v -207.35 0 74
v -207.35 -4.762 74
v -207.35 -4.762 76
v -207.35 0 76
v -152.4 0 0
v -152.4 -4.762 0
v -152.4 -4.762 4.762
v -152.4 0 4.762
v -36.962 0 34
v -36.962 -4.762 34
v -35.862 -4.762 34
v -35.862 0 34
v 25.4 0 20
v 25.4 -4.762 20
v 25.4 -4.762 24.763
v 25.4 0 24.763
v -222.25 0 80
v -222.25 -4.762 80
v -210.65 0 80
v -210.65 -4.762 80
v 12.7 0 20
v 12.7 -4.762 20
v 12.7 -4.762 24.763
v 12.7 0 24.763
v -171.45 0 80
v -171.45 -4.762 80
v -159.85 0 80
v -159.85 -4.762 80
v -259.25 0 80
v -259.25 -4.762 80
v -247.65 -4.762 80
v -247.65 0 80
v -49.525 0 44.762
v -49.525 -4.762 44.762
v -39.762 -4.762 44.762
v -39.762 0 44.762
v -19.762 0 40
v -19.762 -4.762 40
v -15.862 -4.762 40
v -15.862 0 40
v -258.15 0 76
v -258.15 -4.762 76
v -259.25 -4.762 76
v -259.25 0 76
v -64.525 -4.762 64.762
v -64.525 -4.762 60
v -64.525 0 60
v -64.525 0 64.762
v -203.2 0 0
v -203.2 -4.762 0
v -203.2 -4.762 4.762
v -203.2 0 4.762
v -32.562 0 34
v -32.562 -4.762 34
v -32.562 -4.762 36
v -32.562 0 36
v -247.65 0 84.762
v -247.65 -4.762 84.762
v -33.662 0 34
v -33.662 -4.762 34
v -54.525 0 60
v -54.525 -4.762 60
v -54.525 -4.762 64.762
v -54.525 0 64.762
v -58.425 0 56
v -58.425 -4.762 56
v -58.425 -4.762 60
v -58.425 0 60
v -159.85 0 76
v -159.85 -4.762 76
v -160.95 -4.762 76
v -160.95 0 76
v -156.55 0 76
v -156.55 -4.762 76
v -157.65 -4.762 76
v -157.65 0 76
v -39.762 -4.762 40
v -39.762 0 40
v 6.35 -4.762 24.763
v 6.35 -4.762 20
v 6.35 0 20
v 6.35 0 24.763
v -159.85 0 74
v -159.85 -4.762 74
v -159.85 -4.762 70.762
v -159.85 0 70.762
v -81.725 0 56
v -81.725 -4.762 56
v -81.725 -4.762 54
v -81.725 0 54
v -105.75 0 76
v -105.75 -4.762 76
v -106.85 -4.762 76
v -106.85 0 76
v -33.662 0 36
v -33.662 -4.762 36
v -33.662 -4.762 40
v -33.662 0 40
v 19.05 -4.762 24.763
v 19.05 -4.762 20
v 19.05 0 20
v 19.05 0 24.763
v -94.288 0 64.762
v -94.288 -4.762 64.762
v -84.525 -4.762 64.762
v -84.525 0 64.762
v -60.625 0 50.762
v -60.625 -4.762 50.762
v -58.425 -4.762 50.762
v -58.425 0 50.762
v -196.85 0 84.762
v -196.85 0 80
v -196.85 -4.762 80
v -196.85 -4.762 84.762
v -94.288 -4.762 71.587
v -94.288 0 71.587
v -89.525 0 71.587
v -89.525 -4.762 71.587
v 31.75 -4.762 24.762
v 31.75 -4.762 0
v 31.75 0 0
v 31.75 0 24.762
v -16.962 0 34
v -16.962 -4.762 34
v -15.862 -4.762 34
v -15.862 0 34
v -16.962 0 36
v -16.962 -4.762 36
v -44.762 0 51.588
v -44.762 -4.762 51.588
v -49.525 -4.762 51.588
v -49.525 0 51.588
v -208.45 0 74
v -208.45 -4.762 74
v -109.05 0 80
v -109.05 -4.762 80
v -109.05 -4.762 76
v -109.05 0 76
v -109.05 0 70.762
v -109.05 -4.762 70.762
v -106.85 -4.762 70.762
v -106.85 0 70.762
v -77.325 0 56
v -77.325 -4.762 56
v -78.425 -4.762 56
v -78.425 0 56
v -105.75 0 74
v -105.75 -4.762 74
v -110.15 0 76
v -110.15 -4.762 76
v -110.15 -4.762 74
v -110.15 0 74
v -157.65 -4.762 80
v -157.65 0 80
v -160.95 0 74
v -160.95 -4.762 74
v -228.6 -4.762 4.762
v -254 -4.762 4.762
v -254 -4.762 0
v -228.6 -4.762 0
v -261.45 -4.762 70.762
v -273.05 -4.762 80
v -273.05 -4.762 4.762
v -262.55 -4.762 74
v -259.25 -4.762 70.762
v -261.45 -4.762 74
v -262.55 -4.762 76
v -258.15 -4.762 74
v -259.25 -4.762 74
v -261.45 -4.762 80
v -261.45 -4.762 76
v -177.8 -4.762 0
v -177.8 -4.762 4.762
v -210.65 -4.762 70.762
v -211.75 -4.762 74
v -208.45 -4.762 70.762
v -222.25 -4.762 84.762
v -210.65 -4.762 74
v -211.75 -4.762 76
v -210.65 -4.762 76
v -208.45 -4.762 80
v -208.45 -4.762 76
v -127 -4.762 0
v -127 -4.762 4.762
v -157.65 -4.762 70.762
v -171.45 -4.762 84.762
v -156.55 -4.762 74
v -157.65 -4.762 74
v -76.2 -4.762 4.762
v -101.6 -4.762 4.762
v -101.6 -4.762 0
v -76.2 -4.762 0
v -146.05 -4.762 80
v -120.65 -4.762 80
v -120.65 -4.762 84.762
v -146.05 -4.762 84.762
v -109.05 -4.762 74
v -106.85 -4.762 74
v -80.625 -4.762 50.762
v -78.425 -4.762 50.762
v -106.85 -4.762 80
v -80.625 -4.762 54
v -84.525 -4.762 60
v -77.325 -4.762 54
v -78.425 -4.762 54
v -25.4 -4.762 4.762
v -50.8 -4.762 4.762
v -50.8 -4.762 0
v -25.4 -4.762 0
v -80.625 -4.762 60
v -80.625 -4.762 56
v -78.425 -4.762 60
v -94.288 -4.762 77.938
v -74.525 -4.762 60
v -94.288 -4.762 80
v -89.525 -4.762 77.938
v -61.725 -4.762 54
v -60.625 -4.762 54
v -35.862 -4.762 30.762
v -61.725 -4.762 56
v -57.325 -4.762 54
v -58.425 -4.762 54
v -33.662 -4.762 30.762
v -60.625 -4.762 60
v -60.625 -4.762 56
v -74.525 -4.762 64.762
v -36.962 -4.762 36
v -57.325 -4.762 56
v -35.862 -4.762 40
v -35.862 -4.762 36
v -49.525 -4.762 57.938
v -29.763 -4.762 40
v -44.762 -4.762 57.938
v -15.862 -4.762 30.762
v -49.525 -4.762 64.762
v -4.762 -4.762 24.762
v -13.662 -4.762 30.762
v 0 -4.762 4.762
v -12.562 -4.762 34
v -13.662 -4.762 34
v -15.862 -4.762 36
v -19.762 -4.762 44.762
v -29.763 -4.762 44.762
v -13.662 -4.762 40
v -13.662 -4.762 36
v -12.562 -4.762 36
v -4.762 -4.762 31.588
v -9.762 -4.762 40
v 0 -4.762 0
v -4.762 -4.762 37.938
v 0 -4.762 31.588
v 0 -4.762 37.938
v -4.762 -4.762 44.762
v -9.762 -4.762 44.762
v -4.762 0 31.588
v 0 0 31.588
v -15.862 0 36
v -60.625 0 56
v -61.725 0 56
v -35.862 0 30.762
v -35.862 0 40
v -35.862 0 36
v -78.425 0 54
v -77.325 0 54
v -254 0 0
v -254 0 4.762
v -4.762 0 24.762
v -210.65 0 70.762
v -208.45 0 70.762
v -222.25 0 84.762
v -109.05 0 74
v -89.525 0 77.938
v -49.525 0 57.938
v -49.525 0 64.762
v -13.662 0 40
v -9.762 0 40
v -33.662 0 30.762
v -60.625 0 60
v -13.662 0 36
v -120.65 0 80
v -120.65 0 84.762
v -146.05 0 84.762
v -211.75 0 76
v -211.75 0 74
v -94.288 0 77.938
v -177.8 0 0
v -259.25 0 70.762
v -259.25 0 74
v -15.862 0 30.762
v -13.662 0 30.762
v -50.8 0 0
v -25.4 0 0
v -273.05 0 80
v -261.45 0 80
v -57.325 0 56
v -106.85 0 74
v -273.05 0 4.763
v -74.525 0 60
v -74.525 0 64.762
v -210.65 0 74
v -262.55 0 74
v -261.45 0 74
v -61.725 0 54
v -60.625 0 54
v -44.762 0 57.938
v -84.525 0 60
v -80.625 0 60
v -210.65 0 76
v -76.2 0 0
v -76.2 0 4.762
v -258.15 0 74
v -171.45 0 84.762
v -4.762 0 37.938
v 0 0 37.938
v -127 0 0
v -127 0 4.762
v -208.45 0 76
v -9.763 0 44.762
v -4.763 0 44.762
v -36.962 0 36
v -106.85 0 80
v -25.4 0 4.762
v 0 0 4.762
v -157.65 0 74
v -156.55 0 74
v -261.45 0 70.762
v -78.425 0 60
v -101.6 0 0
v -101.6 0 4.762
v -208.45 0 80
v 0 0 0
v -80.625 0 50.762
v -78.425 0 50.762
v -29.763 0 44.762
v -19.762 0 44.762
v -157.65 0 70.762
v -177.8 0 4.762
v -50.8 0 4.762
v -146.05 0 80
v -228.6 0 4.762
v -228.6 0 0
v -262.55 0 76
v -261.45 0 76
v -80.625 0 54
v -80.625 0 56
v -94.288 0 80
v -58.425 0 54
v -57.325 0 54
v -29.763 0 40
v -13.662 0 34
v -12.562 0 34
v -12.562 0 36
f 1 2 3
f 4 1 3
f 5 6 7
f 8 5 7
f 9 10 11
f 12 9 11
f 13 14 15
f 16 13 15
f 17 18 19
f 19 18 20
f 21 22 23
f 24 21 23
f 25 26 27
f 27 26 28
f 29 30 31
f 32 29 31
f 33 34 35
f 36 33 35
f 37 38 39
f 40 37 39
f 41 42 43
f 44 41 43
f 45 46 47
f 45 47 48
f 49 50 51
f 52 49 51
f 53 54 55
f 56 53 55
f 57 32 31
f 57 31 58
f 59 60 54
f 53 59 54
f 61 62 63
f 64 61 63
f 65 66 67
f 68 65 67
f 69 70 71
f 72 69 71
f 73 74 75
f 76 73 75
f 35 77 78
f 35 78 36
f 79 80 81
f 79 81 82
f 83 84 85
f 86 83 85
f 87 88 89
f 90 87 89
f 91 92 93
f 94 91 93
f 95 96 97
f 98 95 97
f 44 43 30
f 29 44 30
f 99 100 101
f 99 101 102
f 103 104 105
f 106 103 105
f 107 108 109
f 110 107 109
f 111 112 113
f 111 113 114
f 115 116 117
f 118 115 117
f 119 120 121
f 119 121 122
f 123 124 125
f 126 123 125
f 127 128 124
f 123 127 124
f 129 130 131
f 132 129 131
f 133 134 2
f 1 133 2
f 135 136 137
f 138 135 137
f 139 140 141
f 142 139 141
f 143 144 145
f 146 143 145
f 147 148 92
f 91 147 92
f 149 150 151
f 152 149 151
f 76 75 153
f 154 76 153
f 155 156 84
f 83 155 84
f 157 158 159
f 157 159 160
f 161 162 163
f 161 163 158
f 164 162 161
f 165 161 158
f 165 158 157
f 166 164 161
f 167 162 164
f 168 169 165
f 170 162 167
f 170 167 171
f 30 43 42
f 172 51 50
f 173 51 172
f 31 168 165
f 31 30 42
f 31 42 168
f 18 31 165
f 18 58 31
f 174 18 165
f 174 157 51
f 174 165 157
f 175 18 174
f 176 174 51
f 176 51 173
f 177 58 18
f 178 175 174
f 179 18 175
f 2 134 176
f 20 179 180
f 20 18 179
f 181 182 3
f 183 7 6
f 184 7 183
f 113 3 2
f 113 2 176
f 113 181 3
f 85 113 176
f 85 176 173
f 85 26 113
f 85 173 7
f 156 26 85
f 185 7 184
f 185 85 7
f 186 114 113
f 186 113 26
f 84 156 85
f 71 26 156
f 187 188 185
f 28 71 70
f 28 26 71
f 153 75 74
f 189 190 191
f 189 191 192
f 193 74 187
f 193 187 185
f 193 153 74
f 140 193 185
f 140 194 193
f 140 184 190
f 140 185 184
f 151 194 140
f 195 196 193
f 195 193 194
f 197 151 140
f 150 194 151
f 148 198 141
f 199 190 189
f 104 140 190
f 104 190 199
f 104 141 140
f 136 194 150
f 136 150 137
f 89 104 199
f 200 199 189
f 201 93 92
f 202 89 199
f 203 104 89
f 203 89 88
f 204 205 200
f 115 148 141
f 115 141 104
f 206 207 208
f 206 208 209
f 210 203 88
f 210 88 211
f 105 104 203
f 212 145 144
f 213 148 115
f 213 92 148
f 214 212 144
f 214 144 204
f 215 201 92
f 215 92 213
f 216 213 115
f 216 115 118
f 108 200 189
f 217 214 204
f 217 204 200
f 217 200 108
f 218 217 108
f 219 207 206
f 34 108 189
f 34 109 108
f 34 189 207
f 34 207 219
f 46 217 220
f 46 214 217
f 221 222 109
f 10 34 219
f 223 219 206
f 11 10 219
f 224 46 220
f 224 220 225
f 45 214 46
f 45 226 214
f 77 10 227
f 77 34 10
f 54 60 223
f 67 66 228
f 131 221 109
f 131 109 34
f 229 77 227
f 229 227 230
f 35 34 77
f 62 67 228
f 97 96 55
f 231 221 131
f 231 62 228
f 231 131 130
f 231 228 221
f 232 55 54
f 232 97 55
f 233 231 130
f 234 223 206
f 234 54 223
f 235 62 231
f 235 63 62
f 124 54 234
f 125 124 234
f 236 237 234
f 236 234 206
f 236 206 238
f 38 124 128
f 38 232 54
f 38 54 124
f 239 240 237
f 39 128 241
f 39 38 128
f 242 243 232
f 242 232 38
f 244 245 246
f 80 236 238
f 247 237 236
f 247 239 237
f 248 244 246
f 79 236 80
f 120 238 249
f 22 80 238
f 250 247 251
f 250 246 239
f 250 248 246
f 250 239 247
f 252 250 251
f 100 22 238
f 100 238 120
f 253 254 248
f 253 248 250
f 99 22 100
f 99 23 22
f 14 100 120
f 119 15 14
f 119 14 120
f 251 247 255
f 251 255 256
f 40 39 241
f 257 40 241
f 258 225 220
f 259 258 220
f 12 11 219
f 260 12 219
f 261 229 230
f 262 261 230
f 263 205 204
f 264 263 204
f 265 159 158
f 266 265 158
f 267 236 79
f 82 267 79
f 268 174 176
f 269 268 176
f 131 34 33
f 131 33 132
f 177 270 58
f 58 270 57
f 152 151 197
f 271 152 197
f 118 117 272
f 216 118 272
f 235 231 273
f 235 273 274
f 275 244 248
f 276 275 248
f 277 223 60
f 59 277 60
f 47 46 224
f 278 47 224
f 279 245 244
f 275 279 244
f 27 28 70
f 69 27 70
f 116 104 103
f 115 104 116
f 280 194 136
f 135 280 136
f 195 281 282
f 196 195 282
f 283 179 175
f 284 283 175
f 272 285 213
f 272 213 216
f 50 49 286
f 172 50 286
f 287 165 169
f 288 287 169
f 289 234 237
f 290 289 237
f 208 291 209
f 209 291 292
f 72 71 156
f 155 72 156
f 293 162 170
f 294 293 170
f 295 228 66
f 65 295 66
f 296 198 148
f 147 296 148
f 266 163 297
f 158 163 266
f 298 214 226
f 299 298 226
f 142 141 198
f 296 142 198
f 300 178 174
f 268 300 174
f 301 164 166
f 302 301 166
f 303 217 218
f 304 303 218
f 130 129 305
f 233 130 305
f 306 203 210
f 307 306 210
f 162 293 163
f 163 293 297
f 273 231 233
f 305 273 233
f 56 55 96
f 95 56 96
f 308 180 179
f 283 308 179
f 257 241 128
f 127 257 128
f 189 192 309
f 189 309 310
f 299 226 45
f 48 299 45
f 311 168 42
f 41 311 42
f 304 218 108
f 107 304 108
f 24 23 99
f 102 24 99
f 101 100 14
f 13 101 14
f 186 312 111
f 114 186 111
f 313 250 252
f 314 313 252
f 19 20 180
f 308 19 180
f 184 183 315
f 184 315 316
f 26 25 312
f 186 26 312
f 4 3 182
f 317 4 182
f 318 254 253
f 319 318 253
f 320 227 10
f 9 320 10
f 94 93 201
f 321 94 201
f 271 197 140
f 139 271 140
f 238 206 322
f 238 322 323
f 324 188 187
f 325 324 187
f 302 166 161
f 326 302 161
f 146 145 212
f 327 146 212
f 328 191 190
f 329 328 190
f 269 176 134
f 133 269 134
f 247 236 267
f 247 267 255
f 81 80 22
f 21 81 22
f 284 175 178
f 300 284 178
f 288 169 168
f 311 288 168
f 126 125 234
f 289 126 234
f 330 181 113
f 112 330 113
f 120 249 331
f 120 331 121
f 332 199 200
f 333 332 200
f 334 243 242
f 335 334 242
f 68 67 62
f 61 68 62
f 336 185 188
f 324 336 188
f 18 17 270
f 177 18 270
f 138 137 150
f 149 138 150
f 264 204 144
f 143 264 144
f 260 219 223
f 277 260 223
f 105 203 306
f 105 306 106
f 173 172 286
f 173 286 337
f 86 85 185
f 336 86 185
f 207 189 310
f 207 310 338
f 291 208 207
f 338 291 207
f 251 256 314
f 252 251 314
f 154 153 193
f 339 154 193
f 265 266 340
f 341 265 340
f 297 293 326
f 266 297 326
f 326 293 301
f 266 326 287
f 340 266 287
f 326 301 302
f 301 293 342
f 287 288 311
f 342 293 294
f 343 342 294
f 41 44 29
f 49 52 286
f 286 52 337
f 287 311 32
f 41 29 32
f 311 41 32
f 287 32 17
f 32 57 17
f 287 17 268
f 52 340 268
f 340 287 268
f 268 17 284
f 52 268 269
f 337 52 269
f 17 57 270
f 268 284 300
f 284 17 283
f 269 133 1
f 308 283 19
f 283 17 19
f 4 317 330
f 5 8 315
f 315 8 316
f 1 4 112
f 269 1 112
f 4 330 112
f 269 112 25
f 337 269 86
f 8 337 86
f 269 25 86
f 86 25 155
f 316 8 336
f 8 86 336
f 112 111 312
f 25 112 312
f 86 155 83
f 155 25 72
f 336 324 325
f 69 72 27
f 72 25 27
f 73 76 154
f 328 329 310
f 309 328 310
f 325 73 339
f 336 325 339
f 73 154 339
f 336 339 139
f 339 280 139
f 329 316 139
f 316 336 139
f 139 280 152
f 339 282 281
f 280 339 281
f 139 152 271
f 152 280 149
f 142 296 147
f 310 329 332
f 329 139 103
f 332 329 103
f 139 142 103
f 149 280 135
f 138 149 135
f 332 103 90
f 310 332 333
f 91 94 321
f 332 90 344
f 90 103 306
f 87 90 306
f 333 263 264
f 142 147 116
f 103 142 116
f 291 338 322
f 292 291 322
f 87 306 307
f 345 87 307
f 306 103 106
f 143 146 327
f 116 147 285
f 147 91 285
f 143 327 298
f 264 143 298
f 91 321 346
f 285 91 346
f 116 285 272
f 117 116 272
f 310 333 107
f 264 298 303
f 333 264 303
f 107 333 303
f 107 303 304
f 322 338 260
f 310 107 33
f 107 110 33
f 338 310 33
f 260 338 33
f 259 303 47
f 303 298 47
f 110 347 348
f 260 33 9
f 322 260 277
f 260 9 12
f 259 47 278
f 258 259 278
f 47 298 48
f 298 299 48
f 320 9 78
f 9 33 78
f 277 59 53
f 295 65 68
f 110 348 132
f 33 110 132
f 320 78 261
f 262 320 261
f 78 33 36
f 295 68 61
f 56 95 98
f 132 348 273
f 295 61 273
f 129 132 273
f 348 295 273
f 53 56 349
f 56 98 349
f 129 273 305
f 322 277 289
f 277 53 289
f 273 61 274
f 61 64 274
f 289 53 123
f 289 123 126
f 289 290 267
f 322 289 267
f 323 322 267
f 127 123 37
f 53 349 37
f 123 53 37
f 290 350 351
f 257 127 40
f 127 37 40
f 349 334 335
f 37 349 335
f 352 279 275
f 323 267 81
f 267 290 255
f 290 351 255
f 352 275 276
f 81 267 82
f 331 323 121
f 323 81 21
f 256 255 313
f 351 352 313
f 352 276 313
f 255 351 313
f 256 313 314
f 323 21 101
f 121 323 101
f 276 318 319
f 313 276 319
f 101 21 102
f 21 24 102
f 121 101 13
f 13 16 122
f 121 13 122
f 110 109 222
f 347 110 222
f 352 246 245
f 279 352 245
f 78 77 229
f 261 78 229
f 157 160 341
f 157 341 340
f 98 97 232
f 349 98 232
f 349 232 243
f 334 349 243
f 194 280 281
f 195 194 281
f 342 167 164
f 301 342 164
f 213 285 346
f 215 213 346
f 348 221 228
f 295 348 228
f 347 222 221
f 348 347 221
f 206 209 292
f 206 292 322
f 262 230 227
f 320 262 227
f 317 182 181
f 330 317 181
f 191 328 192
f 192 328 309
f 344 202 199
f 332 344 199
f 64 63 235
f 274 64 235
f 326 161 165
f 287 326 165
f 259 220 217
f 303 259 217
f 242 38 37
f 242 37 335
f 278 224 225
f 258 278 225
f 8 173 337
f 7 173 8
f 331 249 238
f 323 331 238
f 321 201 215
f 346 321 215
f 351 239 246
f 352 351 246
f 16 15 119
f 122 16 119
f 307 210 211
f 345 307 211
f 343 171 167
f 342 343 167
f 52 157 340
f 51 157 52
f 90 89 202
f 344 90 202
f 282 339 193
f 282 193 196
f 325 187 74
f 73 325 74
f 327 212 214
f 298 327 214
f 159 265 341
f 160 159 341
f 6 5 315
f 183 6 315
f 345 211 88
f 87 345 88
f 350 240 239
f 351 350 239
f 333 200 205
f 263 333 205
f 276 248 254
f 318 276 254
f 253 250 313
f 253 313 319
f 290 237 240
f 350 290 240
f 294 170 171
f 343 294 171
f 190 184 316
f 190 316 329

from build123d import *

# Parameters (mm, degrees)
F1_DEPTH  = 4.7625
F2_W      = 19.05
F2_H      = 4.7625
F2_W_2    = 25.4
F3_DEPTH  = 25.4
F4_W      = 4.7625
F4_H      = 6.825
F4_W_2    = 0.2375
F4_W_3    = 4.525
F5_DEPTH  = 25.4
F6_W      = 31.75
F6_H      = 24.7625
F7_DEPTH  = 4.7625
F8_W      = 4.7625
F8_H      = 6.825
F9_DEPTH  = 25.4
F10_W     = 6.35
F10_H     = 4.7625
F11_DEPTH = 25.4
F12_W     = 10
F12_H     = 4.7625
F13_DEPTH = 25.4
F14_W     = 25.4
F14_H     = 4.7625
F14_W_2   = 26.3625
F15_DEPTH = 25.4
F17_DEPTH = 25.4


with BuildPart() as f1:
    # F0 (on Front) → F1 (new body)
    with BuildSketch(Plane.XZ):
        Polygon((-273.05, 0), (0, 0), (0, 44.7625), (-44.7625, 44.7625), (-44.7625, 64.7625), (-89.525, 64.7625), (-89.525, 84.7625), (-129.525, 84.7625), (-273.05, 84.7625), align=None)
    extrude(amount=F1_DEPTH)

    # F2 (on face) → F3 (cut)
    with BuildSketch(Plane.XZ.offset(4.7625)):
        with Locations((-263.525, 2.38125)):
            Rectangle(F2_W, F2_H)
        with Locations((-12.7, 2.38125)):
            Rectangle(F2_W_2, F2_H)
        with Locations((-63.5, 2.38125)):
            Rectangle(F2_W_2, F2_H)
        with Locations((-114.3, 2.38125)):
            Rectangle(F2_W_2, F2_H)
        with Locations((-165.1, 2.38125)):
            Rectangle(F2_W_2, F2_H)
        with Locations((-215.9, 2.38125)):
            Rectangle(F2_W_2, F2_H)
    extrude(amount=-F3_DEPTH, mode=Mode.SUBTRACT)

    # F4 (on face) → F5 (cut)
    with BuildSketch(Plane.XZ.offset(4.7625)):
        with Locations((-47.14375, 61.35)):
            Rectangle(F4_W, F4_H)
        with Locations((-44.88125, 48.175)):
            Rectangle(F4_W_2, F4_H)
        with Locations((-47.2625, 48.175)):
            Rectangle(F4_W_3, F4_H)
        with Locations((-91.90625, 81.35)):
            Rectangle(F4_W, F4_H)
        with Locations((-91.90625, 68.175)):
            Rectangle(F4_W, F4_H)
    extrude(amount=-F5_DEPTH, mode=Mode.SUBTRACT)

    # F6 (on face) → F7 (join)
    with BuildSketch(Plane.XZ.offset(4.7625)):
        with Locations((15.875, 12.38125)):
            Rectangle(F6_W, F6_H)
    extrude(amount=-F7_DEPTH)

    # F8 (on face) → F9 (cut)
    with BuildSketch(Plane.XZ.offset(4.7625)):
        with Locations((-2.38125, 41.35)):
            Rectangle(F8_W, F8_H)
        with Locations((-2.38125, 28.175)):
            Rectangle(F8_W, F8_H)
    extrude(amount=-F9_DEPTH, mode=Mode.SUBTRACT)

    # F10 (on face) → F11 (cut)
    with BuildSketch(Plane.XZ.offset(4.7625)):
        with Locations((9.525, 22.38125)):
            Rectangle(F10_W, F10_H)
        with Locations((22.225, 22.38125)):
            Rectangle(F10_W, F10_H)
    extrude(amount=-F11_DEPTH, mode=Mode.SUBTRACT)

    # F12 (on face) → F13 (cut)
    with BuildSketch(Plane.XZ.offset(4.7625)):
        with Locations((-34.7625, 42.38125)):
            Rectangle(F12_W, F12_H)
        with Locations((-14.7625, 42.38125)):
            Rectangle(F12_W, F12_H)
        with Locations((-79.525, 62.38125)):
            Rectangle(F12_W, F12_H)
        with Locations((-59.525, 62.38125)):
            Rectangle(F12_W, F12_H)
    extrude(amount=-F13_DEPTH, mode=Mode.SUBTRACT)

    # F14 (on face) → F15 (cut)
    with BuildSketch(Plane.XZ.offset(4.7625)):
        with Locations((-209.55, 82.38125)):
            Rectangle(F14_W, F14_H)
        with Locations((-260.35, 82.38125)):
            Rectangle(F14_W, F14_H)
        with Locations((-158.75, 82.38125)):
            Rectangle(F14_W, F14_H)
        with Locations((-107.46875, 82.38125)):
            Rectangle(F14_W_2, F14_H)
    extrude(amount=-F15_DEPTH, mode=Mode.SUBTRACT)

    # F16 (on face) → F17 (cut)
    with BuildSketch(Plane.XZ.offset(4.7625)):
        Polygon((-33.6625, 40), (-35.8625, 40), (-35.8625, 36), (-36.9625, 36), (-36.9625, 34), (-35.8625, 34), (-35.8625, 30.7625), (-34.7625, 30.7625), (-33.6625, 30.7625), (-33.6625, 34), (-32.5625, 34), (-32.5625, 36), (-33.6625, 36), align=None)
        Polygon((-13.6625, 40), (-15.8625, 40), (-15.8625, 36), (-16.9625, 36), (-16.9625, 34), (-15.8625, 34), (-15.8625, 30.7625), (-14.7625, 30.7625), (-13.6625, 30.7625), (-13.6625, 34), (-12.5625, 34), (-12.5625, 36), (-13.6625, 36), align=None)
        Polygon((-78.425, 60), (-80.625, 60), (-80.625, 56), (-81.725, 56), (-81.725, 54), (-80.625, 54), (-80.625, 50.7625), (-79.525, 50.7625), (-78.425, 50.7625), (-78.425, 54), (-77.325, 54), (-77.325, 56), (-78.425, 56), align=None)
        Polygon((-58.425, 60), (-60.625, 60), (-60.625, 56), (-61.725, 56), (-61.725, 54), (-60.625, 54), (-60.625, 50.7625), (-59.525, 50.7625), (-58.425, 50.7625), (-58.425, 54), (-57.325, 54), (-57.325, 56), (-58.425, 56), align=None)
        Polygon((-157.65, 80), (-159.85, 80), (-159.85, 76), (-160.95, 76), (-160.95, 74), (-159.85, 74), (-159.85, 70.7625), (-158.75, 70.7625), (-157.65, 70.7625), (-157.65, 74), (-156.55, 74), (-156.55, 76), (-157.65, 76), align=None)
        Polygon((-208.45, 80), (-210.65, 80), (-210.65, 76), (-211.75, 76), (-211.75, 74), (-210.65, 74), (-210.65, 70.7625), (-209.55, 70.7625), (-208.45, 70.7625), (-208.45, 74), (-207.35, 74), (-207.35, 76), (-208.45, 76), align=None)
        Polygon((-259.25, 80), (-261.45, 80), (-261.45, 76), (-262.55, 76), (-262.55, 74), (-261.45, 74), (-261.45, 70.7625), (-260.35, 70.7625), (-259.25, 70.7625), (-259.25, 74), (-258.15, 74), (-258.15, 76), (-259.25, 76), align=None)
        Polygon((-106.85, 80), (-109.05, 80), (-109.05, 76), (-110.15, 76), (-110.15, 74), (-109.05, 74), (-109.05, 70.7625), (-107.95, 70.7625), (-106.85, 70.7625), (-106.85, 74), (-105.75, 74), (-105.75, 76), (-106.85, 76), align=None)
    extrude(amount=-F17_DEPTH, mode=Mode.SUBTRACT)


solid = f1.part
